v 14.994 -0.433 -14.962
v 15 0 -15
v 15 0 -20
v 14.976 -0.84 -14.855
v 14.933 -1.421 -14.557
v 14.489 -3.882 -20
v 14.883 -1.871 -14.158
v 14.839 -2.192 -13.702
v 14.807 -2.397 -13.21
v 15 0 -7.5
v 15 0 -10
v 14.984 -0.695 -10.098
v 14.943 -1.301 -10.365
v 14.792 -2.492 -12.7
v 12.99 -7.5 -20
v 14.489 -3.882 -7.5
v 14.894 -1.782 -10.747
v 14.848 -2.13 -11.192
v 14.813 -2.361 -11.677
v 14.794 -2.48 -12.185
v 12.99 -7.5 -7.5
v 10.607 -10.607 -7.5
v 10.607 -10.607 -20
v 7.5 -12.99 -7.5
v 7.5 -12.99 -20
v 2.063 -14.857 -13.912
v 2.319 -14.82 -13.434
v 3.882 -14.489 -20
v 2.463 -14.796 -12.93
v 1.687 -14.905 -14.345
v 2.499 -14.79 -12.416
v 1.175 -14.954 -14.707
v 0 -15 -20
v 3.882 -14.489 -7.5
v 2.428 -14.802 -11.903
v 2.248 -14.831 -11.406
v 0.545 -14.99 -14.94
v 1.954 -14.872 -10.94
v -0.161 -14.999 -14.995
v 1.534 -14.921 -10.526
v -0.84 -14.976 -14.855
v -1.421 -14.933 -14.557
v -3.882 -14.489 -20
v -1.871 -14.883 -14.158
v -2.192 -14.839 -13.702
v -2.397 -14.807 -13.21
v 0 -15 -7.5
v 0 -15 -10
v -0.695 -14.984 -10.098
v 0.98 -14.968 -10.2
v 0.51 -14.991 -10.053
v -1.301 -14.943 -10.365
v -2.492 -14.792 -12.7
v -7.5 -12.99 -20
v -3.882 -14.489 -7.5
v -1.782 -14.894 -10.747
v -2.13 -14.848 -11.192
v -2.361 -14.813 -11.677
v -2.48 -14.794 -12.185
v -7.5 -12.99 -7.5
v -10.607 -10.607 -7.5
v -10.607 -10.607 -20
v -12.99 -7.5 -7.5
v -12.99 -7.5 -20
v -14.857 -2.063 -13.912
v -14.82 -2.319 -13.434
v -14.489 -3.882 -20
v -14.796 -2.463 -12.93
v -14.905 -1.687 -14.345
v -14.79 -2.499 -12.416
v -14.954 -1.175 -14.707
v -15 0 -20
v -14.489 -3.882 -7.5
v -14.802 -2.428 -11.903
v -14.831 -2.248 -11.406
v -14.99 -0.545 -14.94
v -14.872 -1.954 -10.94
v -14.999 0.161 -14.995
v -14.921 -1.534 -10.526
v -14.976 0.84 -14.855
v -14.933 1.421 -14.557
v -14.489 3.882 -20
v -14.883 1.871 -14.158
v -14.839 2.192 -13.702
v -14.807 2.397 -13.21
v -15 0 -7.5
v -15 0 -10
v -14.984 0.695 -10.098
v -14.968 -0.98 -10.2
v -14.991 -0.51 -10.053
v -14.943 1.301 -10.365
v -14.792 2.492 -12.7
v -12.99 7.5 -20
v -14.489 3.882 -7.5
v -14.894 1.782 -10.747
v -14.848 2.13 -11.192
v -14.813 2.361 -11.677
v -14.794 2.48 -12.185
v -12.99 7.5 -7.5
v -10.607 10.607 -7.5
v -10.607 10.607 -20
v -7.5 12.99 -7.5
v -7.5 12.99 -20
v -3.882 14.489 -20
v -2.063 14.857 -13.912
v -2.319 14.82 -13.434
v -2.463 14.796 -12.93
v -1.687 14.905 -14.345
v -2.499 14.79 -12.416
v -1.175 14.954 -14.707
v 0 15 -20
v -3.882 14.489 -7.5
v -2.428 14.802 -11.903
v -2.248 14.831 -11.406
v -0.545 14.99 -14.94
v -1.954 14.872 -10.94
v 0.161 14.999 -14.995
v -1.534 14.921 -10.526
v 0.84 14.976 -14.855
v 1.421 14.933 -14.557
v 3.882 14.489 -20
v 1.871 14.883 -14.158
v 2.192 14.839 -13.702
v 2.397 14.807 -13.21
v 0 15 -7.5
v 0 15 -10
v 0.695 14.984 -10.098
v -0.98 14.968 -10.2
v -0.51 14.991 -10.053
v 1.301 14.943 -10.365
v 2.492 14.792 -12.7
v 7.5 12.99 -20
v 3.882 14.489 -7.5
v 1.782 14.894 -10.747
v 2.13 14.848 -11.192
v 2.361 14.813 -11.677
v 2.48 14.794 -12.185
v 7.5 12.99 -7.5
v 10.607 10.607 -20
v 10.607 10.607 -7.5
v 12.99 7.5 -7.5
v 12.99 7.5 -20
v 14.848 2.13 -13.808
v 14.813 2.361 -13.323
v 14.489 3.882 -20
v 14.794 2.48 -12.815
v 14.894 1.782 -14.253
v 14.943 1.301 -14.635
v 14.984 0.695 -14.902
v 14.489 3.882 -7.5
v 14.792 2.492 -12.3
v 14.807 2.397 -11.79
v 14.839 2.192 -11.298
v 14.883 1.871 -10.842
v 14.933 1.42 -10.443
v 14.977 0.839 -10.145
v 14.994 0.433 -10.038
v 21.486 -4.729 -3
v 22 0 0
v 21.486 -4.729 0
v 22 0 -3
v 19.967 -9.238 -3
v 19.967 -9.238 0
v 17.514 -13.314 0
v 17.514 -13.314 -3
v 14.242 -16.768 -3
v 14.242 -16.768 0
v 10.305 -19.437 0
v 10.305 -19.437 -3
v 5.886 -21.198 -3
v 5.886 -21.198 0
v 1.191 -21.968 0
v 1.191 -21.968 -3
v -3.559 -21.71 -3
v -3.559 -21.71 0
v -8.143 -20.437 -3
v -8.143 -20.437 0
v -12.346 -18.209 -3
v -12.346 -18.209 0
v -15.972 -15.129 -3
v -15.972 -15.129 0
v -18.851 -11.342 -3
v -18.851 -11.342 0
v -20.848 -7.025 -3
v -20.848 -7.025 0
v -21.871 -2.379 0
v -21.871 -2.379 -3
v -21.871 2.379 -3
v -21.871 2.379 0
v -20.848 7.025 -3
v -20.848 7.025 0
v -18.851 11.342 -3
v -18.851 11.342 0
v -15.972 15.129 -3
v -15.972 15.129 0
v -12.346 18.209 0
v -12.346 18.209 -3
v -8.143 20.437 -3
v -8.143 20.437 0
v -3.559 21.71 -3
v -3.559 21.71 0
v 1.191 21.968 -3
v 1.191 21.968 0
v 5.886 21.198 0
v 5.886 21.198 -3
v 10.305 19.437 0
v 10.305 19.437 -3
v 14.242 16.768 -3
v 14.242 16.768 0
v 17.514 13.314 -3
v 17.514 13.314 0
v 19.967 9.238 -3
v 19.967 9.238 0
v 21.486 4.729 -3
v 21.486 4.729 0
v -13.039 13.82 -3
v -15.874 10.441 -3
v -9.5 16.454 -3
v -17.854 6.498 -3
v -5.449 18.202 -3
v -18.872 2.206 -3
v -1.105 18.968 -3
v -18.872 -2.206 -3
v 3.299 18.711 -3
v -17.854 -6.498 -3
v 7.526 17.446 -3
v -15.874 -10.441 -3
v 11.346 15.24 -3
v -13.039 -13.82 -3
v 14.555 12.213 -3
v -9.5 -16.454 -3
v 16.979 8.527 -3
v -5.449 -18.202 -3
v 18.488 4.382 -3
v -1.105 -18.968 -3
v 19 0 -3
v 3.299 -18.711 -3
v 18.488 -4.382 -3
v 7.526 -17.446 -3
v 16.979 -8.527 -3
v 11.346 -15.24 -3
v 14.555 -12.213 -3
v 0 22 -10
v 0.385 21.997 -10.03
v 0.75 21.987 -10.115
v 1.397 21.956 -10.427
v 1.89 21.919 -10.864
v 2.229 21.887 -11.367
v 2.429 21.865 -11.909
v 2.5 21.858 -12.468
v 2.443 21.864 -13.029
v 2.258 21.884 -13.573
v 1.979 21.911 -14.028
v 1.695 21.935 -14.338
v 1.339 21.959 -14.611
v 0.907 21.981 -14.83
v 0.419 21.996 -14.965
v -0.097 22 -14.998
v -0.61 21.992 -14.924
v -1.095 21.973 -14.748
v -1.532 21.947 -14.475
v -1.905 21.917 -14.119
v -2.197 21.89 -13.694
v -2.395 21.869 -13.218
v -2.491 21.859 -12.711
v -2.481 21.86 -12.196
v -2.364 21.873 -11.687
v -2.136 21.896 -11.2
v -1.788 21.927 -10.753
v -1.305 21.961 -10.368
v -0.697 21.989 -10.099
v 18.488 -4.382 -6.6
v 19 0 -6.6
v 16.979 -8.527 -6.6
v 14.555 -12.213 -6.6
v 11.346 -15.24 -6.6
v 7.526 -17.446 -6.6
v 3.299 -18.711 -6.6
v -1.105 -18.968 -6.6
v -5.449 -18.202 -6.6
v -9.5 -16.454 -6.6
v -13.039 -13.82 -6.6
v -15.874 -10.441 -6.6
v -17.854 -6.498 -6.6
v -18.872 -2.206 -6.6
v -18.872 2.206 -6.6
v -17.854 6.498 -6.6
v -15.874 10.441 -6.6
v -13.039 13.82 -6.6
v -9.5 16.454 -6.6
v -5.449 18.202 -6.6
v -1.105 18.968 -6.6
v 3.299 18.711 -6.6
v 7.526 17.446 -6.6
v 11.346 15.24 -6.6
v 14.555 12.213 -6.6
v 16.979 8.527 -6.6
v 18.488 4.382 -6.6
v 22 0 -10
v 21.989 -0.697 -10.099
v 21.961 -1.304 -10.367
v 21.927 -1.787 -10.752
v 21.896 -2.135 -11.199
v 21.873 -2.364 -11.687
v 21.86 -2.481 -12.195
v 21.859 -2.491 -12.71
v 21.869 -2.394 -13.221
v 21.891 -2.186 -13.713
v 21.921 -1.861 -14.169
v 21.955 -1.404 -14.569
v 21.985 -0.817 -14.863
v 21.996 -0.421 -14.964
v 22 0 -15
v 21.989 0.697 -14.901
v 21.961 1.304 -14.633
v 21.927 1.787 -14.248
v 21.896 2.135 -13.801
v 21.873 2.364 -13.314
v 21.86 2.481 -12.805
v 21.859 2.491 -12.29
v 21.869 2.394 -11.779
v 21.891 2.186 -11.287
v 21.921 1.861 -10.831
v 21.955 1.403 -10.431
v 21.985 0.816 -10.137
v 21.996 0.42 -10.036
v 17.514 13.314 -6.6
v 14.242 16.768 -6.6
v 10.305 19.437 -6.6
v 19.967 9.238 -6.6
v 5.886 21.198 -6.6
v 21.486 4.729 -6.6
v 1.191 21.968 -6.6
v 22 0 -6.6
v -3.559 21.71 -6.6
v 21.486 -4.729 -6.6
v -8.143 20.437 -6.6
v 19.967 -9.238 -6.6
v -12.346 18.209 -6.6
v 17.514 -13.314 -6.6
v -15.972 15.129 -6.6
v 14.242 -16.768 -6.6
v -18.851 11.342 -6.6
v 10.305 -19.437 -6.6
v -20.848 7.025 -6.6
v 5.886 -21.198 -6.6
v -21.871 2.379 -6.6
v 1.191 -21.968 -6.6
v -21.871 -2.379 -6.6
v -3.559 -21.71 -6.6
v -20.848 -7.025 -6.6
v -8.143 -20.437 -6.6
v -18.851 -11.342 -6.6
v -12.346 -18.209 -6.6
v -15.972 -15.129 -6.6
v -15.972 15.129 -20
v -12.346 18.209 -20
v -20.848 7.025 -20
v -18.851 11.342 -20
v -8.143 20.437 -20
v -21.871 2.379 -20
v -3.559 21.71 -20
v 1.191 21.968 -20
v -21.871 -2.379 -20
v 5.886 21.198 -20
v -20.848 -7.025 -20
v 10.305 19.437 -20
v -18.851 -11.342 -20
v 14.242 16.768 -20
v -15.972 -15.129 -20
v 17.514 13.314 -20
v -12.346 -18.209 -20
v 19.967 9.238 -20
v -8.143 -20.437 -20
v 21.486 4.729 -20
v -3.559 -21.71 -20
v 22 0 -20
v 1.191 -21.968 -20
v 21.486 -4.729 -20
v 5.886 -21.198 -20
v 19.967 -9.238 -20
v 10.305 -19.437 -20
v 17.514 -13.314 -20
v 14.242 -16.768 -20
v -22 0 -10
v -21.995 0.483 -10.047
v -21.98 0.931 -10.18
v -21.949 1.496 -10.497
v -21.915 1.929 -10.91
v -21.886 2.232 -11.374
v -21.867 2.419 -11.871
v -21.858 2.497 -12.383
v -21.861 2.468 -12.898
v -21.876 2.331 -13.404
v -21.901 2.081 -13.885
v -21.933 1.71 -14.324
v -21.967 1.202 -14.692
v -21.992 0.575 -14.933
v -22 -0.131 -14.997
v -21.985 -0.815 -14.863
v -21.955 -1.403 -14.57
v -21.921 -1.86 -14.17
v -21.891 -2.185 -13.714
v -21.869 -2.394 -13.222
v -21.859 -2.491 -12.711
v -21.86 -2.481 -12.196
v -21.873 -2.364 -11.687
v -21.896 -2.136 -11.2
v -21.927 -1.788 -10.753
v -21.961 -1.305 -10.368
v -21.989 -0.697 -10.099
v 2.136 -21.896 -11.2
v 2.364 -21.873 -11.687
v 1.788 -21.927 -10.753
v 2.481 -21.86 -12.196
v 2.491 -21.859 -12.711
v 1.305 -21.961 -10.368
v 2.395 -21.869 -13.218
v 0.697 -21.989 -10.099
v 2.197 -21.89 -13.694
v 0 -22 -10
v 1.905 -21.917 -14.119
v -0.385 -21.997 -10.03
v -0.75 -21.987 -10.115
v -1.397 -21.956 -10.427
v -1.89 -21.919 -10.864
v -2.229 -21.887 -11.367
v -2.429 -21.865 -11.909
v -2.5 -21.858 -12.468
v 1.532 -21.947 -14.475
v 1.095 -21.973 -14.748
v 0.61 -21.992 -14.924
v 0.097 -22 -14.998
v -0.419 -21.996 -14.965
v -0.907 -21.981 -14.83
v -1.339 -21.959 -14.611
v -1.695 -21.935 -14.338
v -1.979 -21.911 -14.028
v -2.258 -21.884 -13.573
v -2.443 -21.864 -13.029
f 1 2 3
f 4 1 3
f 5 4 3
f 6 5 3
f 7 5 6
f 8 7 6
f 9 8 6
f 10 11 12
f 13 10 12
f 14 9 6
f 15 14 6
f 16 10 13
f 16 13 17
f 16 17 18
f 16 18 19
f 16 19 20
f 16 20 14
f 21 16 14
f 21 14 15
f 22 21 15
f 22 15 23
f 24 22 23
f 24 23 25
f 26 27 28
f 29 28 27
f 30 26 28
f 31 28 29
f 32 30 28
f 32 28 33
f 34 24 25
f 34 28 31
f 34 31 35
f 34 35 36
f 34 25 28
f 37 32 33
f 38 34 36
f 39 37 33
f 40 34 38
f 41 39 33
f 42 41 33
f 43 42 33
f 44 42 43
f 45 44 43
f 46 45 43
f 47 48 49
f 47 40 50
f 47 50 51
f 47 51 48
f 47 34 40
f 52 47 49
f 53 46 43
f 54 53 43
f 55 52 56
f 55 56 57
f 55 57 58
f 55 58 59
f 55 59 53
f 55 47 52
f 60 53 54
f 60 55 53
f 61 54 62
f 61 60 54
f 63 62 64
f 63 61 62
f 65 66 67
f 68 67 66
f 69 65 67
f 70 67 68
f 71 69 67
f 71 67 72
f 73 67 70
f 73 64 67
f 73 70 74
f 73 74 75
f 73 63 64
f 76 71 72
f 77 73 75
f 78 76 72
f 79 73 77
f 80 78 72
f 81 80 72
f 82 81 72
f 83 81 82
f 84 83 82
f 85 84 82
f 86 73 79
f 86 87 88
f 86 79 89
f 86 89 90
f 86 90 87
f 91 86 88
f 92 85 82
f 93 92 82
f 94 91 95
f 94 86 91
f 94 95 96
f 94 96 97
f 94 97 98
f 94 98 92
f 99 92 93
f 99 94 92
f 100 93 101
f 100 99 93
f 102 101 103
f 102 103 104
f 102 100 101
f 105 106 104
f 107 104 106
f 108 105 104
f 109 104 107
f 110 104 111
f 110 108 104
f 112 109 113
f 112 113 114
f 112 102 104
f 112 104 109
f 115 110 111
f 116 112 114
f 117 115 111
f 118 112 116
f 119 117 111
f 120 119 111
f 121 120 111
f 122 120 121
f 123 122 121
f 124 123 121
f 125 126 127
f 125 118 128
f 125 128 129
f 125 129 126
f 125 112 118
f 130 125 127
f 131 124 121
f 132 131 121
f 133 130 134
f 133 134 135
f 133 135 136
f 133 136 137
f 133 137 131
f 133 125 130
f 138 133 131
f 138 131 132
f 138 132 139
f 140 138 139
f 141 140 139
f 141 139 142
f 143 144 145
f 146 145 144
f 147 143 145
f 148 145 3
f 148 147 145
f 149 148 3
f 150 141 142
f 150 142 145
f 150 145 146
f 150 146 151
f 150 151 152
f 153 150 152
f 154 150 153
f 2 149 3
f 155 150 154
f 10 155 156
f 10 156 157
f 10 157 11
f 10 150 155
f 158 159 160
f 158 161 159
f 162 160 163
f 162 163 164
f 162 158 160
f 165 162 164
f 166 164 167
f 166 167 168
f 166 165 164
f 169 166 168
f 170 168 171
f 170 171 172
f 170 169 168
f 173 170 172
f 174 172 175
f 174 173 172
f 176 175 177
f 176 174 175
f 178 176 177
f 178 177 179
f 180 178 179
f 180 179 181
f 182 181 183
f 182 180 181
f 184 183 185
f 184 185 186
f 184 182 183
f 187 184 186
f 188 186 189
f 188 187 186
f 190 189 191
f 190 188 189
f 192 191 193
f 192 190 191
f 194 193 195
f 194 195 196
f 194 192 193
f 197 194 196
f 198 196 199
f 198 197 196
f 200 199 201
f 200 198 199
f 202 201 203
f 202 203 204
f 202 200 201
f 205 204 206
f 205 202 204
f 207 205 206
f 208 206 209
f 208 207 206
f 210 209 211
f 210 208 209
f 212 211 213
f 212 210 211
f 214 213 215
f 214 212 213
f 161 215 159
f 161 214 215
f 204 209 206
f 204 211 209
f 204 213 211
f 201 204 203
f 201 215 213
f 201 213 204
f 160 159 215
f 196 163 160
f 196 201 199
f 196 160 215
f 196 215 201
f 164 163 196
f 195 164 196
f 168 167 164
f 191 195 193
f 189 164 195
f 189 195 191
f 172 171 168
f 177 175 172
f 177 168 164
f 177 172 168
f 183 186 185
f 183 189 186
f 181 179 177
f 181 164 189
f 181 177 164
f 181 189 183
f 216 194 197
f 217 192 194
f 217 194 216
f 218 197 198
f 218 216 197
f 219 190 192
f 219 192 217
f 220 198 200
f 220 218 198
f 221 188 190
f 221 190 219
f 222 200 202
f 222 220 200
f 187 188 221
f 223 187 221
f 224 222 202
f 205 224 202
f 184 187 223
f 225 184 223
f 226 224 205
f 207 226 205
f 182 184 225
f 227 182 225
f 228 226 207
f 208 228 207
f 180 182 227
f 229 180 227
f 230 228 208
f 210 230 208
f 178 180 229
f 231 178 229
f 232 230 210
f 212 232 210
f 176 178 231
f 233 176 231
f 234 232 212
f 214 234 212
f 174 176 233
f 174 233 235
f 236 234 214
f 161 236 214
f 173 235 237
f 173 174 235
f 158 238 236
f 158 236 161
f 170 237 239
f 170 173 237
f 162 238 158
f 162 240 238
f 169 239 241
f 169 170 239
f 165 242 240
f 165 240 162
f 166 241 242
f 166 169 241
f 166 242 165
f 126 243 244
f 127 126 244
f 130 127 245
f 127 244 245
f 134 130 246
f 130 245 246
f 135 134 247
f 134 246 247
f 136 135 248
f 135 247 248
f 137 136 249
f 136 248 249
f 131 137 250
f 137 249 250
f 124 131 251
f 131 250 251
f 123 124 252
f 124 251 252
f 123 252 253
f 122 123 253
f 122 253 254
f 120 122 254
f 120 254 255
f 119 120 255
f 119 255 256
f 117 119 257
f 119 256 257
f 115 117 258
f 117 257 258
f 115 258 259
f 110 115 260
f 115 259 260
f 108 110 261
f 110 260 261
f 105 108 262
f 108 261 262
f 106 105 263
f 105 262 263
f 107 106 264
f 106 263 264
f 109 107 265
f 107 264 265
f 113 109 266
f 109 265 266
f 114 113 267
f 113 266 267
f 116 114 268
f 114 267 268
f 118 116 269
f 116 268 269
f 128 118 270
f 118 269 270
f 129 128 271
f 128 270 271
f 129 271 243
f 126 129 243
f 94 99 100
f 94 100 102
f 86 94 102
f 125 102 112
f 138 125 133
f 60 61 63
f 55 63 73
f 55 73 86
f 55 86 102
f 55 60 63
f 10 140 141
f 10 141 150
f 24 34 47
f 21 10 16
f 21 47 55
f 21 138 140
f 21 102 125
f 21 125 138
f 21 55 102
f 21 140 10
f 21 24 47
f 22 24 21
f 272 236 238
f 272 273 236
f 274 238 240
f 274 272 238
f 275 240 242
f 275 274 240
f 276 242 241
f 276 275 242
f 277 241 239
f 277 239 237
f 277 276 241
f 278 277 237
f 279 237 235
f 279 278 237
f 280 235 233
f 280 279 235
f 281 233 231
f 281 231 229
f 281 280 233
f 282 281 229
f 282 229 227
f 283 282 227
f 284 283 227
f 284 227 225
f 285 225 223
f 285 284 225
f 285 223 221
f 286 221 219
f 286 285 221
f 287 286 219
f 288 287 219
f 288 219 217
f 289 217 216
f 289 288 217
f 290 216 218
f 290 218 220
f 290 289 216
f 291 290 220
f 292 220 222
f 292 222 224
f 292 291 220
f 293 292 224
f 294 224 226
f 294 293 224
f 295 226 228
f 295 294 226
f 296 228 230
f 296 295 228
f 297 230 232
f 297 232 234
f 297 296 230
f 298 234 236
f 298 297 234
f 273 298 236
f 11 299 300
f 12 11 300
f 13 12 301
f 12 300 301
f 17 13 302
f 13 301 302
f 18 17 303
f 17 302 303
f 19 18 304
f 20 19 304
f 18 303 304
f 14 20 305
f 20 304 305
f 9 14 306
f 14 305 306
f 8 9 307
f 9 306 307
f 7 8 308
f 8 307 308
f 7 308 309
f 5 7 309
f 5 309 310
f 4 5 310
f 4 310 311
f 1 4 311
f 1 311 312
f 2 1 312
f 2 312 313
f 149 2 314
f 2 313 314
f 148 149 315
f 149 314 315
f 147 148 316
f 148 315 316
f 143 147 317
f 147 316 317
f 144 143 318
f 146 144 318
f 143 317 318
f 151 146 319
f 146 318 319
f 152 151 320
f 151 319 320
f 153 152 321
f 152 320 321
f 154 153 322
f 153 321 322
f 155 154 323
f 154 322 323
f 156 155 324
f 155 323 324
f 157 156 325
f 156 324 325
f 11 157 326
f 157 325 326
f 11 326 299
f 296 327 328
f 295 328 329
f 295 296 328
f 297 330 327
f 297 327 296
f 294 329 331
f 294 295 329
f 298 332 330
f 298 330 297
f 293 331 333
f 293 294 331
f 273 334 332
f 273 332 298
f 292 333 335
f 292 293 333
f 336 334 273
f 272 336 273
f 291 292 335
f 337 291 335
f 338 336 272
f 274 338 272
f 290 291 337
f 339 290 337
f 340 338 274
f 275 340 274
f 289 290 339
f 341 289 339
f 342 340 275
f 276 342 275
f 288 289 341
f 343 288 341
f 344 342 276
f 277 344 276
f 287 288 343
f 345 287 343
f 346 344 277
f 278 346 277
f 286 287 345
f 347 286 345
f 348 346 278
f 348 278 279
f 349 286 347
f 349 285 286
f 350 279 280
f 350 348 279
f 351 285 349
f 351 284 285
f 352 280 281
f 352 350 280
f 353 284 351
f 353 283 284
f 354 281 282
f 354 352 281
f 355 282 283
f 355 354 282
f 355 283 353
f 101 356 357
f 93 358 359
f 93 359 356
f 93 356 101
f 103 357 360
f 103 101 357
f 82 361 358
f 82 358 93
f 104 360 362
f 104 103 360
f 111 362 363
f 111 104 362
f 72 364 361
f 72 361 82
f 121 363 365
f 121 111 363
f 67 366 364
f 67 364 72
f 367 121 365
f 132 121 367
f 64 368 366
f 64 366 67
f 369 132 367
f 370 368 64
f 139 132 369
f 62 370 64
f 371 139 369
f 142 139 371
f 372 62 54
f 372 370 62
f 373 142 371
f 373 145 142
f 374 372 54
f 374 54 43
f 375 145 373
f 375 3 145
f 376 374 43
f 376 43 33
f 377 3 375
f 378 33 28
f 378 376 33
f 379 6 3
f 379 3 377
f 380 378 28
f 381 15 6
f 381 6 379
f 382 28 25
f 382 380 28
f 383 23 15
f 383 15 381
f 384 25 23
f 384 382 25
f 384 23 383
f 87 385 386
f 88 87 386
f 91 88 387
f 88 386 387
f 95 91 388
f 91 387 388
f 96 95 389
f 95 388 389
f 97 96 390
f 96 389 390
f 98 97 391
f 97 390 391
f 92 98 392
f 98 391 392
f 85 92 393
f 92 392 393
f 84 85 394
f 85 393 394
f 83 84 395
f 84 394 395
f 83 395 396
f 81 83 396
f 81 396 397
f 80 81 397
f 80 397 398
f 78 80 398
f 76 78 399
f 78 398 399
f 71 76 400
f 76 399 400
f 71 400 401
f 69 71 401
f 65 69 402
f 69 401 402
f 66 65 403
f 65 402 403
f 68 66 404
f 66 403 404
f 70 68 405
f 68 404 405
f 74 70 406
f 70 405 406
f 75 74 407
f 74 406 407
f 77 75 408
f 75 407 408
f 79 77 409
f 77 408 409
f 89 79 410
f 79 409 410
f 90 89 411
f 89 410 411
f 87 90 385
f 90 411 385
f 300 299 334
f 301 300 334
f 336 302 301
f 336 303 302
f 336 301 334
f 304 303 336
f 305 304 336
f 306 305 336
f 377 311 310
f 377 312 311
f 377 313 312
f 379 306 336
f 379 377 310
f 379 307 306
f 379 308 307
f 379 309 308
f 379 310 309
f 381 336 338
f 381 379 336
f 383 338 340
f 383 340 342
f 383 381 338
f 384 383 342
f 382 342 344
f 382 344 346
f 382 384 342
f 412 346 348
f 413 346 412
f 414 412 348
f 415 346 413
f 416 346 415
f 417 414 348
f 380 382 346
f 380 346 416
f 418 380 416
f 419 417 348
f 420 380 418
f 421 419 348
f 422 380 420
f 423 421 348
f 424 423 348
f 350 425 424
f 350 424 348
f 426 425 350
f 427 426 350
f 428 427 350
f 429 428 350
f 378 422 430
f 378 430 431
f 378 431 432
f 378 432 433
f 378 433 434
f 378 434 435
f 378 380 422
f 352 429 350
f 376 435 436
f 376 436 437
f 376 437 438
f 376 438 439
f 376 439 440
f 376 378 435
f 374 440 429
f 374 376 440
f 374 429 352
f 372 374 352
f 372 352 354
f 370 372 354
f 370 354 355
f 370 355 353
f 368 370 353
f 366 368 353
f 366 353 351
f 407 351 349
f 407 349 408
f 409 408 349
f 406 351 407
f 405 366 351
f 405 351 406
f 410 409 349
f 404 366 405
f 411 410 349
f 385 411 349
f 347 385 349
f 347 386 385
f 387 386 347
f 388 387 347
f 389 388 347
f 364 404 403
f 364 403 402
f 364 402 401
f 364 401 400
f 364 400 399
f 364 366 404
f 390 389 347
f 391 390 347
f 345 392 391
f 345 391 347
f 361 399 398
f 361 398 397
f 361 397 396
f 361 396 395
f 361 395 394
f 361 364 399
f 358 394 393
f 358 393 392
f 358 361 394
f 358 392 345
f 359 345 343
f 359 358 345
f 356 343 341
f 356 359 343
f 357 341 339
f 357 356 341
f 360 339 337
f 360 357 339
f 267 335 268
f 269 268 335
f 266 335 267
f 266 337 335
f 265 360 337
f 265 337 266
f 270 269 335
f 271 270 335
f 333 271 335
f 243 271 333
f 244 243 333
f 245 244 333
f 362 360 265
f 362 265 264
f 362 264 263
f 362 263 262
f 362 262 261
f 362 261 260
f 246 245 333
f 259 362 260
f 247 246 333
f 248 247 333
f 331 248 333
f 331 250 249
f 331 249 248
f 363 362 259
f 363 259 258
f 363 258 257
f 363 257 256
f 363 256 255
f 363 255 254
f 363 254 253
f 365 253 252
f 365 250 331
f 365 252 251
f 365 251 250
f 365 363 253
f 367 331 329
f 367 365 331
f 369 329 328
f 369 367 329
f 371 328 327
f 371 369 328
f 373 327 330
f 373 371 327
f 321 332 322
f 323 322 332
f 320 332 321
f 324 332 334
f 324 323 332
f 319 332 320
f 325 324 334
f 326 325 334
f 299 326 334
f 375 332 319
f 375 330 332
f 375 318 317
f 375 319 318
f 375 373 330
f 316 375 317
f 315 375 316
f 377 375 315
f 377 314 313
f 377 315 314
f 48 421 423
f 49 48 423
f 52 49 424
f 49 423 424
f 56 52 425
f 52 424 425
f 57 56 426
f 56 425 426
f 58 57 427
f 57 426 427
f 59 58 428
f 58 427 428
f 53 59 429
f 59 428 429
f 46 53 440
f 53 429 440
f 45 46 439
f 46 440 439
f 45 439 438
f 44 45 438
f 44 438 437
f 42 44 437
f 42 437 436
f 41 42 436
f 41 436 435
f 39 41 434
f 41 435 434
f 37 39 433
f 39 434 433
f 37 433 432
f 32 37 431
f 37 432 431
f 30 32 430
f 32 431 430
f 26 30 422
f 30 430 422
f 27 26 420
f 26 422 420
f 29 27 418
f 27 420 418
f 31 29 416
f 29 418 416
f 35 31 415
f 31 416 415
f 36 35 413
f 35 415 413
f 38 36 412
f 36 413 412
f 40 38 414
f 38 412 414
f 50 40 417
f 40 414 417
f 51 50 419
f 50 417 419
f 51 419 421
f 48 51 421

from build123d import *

# Parameters (mm, degrees)
CORTE_EXTRUS_O1_REACH      = 55.104
CORTE_EXTRUS_O1_END_RADIUS = 15
ESBO_O3_R                  = 2.5
PADR_OCIRCULAR1_COUNT      = 4


with BuildPart() as part:
    # Esbo_o1 → Revolu_o1 (revolve)
    with BuildSketch(Plane(origin=(0, 0, 0), x_dir=(1, 0, 0), z_dir=(0, 1, 0)), mode=Mode.PRIVATE) as revolu_o1_sk:
        Polygon((0, 0), (-22, 0), (-22, 3), (-19, 3), (-19, 6.6), (-22, 6.6), (-22, 20), (-15, 20), (-15, 7.5), (0, 7.5), align=None)
    revolve(revolu_o1_sk.sketch.rotate(Axis((0, 0, 0), (0, 0, -1)), 180), axis=Axis((0, 0, 0), (0, 0, -1)))

    # Corte-extrus_o1: up to this cylinder (the profile starts outside it)
    corte_extrus_o1_end = Plane(origin=(0, 0, -12.5), z_dir=(0, 0, 1)) * Cylinder(CORTE_EXTRUS_O1_END_RADIUS, 141.208, mode=Mode.PRIVATE)
    # Esbo_o3 → Corte-extrus_o1 (cut, up to the surface)
    with BuildSketch(Plane.ZY.offset(22), mode=Mode.PRIVATE) as corte_extrus_o1_sk1:
        with Locations((-12.5, 0)):
            Circle(ESBO_O3_R)
    corte_extrus_o1_tool1 = extrude(corte_extrus_o1_sk1.sketch, amount=-CORTE_EXTRUS_O1_REACH, mode=Mode.PRIVATE) - corte_extrus_o1_end
    corte_extrus_o1 = corte_extrus_o1_tool1.solids().sort_by_distance((-22, 0, -12.5))[0]
    add(corte_extrus_o1, mode=Mode.SUBTRACT)

    # Padr_oCircular1: Corte-extrus_o1 ×4 about axis
    padr_ocircular1_axis = Axis((0, 0, -20), (0, 0, 1))
    for i in range(1, PADR_OCIRCULAR1_COUNT):
        add(corte_extrus_o1.rotate(padr_ocircular1_axis, i * 360 / PADR_OCIRCULAR1_COUNT), mode=Mode.SUBTRACT)


solid = part.part
